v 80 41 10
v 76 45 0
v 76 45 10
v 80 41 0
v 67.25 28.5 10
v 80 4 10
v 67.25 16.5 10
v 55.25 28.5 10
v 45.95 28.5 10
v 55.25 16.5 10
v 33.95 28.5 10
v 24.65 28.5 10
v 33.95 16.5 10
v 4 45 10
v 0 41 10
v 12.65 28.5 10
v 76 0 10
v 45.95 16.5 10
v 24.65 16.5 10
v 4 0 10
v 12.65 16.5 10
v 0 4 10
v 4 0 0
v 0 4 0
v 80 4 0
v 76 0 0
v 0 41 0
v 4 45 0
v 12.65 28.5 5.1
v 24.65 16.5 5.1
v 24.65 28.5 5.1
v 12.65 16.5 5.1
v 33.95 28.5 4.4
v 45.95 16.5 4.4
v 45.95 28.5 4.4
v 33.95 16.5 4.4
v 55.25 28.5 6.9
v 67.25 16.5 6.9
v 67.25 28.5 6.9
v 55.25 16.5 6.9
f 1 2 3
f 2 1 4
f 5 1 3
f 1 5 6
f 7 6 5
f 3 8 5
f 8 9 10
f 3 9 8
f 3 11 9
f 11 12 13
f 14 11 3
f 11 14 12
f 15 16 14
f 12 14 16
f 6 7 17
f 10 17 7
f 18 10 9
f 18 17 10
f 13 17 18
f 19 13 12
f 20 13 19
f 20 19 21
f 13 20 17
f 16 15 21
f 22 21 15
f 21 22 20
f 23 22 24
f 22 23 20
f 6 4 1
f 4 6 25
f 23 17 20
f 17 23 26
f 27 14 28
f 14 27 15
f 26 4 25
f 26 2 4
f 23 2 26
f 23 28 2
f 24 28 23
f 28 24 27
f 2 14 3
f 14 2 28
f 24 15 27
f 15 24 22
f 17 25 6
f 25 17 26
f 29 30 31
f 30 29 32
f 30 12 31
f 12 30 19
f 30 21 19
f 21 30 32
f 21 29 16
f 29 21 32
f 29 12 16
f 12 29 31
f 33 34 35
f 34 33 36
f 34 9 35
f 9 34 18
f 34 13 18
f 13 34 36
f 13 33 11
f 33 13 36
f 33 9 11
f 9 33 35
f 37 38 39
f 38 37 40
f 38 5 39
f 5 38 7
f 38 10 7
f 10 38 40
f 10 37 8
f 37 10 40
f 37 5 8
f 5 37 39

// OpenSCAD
$fn = 32;

// ----------------------------------------------------------------------
// Windowed plate: 3 voids, 80 x 45 x 10 mm
// ----------------------------------------------------------------------

// --- parameters (mm) ---
plate_l = 80;             // plate length, X
plate_w = 45;             // plate width, Y
plate_t = 10;             // plate thickness, Z
edge_margin = 8;          // wall from the plate edge to any window
windows = 3;              // number of windows in the row
win_l = 12;               // window length
win_w = 12;               // window width
win_pitch = 21.3;         // window pitch along X
depth_1 = 4.9;            // depth of void 1 (full thickness = through)
depth_2 = 5.6;            // depth of void 2 (full thickness = through)
depth_3 = 3.1;            // depth of void 3 (full thickness = through)
corner_c = 4;             // corner chamfer of the plate

profile = [[4, 0], [76, 0], [80, 4], [80, 41], [76, 45], [4, 45], [0, 41], [0, 4]];  // primary outline, 8 points, counter clockwise
void_1 = [[12.65, 16.5], [24.65, 16.5], [24.65, 28.5], [12.65, 28.5]];  // window 1 of the row, 4 points
void_2 = [[33.95, 16.5], [45.95, 16.5], [45.95, 28.5], [33.95, 28.5]];  // window 2 of the row, 4 points
void_3 = [[55.25, 16.5], [67.25, 16.5], [67.25, 28.5], [55.25, 28.5]];  // window 3 of the row, 4 points

// --- the one profile operation ---
difference() {
  linear_extrude(height = plate_t) polygon(points = profile);
  translate([0, 0, plate_t - depth_1])
    linear_extrude(height = depth_1 + 1) polygon(points = void_1);
  translate([0, 0, plate_t - depth_2])
    linear_extrude(height = depth_2 + 1) polygon(points = void_2);
  translate([0, 0, plate_t - depth_3])
    linear_extrude(height = depth_3 + 1) polygon(points = void_3);
}
